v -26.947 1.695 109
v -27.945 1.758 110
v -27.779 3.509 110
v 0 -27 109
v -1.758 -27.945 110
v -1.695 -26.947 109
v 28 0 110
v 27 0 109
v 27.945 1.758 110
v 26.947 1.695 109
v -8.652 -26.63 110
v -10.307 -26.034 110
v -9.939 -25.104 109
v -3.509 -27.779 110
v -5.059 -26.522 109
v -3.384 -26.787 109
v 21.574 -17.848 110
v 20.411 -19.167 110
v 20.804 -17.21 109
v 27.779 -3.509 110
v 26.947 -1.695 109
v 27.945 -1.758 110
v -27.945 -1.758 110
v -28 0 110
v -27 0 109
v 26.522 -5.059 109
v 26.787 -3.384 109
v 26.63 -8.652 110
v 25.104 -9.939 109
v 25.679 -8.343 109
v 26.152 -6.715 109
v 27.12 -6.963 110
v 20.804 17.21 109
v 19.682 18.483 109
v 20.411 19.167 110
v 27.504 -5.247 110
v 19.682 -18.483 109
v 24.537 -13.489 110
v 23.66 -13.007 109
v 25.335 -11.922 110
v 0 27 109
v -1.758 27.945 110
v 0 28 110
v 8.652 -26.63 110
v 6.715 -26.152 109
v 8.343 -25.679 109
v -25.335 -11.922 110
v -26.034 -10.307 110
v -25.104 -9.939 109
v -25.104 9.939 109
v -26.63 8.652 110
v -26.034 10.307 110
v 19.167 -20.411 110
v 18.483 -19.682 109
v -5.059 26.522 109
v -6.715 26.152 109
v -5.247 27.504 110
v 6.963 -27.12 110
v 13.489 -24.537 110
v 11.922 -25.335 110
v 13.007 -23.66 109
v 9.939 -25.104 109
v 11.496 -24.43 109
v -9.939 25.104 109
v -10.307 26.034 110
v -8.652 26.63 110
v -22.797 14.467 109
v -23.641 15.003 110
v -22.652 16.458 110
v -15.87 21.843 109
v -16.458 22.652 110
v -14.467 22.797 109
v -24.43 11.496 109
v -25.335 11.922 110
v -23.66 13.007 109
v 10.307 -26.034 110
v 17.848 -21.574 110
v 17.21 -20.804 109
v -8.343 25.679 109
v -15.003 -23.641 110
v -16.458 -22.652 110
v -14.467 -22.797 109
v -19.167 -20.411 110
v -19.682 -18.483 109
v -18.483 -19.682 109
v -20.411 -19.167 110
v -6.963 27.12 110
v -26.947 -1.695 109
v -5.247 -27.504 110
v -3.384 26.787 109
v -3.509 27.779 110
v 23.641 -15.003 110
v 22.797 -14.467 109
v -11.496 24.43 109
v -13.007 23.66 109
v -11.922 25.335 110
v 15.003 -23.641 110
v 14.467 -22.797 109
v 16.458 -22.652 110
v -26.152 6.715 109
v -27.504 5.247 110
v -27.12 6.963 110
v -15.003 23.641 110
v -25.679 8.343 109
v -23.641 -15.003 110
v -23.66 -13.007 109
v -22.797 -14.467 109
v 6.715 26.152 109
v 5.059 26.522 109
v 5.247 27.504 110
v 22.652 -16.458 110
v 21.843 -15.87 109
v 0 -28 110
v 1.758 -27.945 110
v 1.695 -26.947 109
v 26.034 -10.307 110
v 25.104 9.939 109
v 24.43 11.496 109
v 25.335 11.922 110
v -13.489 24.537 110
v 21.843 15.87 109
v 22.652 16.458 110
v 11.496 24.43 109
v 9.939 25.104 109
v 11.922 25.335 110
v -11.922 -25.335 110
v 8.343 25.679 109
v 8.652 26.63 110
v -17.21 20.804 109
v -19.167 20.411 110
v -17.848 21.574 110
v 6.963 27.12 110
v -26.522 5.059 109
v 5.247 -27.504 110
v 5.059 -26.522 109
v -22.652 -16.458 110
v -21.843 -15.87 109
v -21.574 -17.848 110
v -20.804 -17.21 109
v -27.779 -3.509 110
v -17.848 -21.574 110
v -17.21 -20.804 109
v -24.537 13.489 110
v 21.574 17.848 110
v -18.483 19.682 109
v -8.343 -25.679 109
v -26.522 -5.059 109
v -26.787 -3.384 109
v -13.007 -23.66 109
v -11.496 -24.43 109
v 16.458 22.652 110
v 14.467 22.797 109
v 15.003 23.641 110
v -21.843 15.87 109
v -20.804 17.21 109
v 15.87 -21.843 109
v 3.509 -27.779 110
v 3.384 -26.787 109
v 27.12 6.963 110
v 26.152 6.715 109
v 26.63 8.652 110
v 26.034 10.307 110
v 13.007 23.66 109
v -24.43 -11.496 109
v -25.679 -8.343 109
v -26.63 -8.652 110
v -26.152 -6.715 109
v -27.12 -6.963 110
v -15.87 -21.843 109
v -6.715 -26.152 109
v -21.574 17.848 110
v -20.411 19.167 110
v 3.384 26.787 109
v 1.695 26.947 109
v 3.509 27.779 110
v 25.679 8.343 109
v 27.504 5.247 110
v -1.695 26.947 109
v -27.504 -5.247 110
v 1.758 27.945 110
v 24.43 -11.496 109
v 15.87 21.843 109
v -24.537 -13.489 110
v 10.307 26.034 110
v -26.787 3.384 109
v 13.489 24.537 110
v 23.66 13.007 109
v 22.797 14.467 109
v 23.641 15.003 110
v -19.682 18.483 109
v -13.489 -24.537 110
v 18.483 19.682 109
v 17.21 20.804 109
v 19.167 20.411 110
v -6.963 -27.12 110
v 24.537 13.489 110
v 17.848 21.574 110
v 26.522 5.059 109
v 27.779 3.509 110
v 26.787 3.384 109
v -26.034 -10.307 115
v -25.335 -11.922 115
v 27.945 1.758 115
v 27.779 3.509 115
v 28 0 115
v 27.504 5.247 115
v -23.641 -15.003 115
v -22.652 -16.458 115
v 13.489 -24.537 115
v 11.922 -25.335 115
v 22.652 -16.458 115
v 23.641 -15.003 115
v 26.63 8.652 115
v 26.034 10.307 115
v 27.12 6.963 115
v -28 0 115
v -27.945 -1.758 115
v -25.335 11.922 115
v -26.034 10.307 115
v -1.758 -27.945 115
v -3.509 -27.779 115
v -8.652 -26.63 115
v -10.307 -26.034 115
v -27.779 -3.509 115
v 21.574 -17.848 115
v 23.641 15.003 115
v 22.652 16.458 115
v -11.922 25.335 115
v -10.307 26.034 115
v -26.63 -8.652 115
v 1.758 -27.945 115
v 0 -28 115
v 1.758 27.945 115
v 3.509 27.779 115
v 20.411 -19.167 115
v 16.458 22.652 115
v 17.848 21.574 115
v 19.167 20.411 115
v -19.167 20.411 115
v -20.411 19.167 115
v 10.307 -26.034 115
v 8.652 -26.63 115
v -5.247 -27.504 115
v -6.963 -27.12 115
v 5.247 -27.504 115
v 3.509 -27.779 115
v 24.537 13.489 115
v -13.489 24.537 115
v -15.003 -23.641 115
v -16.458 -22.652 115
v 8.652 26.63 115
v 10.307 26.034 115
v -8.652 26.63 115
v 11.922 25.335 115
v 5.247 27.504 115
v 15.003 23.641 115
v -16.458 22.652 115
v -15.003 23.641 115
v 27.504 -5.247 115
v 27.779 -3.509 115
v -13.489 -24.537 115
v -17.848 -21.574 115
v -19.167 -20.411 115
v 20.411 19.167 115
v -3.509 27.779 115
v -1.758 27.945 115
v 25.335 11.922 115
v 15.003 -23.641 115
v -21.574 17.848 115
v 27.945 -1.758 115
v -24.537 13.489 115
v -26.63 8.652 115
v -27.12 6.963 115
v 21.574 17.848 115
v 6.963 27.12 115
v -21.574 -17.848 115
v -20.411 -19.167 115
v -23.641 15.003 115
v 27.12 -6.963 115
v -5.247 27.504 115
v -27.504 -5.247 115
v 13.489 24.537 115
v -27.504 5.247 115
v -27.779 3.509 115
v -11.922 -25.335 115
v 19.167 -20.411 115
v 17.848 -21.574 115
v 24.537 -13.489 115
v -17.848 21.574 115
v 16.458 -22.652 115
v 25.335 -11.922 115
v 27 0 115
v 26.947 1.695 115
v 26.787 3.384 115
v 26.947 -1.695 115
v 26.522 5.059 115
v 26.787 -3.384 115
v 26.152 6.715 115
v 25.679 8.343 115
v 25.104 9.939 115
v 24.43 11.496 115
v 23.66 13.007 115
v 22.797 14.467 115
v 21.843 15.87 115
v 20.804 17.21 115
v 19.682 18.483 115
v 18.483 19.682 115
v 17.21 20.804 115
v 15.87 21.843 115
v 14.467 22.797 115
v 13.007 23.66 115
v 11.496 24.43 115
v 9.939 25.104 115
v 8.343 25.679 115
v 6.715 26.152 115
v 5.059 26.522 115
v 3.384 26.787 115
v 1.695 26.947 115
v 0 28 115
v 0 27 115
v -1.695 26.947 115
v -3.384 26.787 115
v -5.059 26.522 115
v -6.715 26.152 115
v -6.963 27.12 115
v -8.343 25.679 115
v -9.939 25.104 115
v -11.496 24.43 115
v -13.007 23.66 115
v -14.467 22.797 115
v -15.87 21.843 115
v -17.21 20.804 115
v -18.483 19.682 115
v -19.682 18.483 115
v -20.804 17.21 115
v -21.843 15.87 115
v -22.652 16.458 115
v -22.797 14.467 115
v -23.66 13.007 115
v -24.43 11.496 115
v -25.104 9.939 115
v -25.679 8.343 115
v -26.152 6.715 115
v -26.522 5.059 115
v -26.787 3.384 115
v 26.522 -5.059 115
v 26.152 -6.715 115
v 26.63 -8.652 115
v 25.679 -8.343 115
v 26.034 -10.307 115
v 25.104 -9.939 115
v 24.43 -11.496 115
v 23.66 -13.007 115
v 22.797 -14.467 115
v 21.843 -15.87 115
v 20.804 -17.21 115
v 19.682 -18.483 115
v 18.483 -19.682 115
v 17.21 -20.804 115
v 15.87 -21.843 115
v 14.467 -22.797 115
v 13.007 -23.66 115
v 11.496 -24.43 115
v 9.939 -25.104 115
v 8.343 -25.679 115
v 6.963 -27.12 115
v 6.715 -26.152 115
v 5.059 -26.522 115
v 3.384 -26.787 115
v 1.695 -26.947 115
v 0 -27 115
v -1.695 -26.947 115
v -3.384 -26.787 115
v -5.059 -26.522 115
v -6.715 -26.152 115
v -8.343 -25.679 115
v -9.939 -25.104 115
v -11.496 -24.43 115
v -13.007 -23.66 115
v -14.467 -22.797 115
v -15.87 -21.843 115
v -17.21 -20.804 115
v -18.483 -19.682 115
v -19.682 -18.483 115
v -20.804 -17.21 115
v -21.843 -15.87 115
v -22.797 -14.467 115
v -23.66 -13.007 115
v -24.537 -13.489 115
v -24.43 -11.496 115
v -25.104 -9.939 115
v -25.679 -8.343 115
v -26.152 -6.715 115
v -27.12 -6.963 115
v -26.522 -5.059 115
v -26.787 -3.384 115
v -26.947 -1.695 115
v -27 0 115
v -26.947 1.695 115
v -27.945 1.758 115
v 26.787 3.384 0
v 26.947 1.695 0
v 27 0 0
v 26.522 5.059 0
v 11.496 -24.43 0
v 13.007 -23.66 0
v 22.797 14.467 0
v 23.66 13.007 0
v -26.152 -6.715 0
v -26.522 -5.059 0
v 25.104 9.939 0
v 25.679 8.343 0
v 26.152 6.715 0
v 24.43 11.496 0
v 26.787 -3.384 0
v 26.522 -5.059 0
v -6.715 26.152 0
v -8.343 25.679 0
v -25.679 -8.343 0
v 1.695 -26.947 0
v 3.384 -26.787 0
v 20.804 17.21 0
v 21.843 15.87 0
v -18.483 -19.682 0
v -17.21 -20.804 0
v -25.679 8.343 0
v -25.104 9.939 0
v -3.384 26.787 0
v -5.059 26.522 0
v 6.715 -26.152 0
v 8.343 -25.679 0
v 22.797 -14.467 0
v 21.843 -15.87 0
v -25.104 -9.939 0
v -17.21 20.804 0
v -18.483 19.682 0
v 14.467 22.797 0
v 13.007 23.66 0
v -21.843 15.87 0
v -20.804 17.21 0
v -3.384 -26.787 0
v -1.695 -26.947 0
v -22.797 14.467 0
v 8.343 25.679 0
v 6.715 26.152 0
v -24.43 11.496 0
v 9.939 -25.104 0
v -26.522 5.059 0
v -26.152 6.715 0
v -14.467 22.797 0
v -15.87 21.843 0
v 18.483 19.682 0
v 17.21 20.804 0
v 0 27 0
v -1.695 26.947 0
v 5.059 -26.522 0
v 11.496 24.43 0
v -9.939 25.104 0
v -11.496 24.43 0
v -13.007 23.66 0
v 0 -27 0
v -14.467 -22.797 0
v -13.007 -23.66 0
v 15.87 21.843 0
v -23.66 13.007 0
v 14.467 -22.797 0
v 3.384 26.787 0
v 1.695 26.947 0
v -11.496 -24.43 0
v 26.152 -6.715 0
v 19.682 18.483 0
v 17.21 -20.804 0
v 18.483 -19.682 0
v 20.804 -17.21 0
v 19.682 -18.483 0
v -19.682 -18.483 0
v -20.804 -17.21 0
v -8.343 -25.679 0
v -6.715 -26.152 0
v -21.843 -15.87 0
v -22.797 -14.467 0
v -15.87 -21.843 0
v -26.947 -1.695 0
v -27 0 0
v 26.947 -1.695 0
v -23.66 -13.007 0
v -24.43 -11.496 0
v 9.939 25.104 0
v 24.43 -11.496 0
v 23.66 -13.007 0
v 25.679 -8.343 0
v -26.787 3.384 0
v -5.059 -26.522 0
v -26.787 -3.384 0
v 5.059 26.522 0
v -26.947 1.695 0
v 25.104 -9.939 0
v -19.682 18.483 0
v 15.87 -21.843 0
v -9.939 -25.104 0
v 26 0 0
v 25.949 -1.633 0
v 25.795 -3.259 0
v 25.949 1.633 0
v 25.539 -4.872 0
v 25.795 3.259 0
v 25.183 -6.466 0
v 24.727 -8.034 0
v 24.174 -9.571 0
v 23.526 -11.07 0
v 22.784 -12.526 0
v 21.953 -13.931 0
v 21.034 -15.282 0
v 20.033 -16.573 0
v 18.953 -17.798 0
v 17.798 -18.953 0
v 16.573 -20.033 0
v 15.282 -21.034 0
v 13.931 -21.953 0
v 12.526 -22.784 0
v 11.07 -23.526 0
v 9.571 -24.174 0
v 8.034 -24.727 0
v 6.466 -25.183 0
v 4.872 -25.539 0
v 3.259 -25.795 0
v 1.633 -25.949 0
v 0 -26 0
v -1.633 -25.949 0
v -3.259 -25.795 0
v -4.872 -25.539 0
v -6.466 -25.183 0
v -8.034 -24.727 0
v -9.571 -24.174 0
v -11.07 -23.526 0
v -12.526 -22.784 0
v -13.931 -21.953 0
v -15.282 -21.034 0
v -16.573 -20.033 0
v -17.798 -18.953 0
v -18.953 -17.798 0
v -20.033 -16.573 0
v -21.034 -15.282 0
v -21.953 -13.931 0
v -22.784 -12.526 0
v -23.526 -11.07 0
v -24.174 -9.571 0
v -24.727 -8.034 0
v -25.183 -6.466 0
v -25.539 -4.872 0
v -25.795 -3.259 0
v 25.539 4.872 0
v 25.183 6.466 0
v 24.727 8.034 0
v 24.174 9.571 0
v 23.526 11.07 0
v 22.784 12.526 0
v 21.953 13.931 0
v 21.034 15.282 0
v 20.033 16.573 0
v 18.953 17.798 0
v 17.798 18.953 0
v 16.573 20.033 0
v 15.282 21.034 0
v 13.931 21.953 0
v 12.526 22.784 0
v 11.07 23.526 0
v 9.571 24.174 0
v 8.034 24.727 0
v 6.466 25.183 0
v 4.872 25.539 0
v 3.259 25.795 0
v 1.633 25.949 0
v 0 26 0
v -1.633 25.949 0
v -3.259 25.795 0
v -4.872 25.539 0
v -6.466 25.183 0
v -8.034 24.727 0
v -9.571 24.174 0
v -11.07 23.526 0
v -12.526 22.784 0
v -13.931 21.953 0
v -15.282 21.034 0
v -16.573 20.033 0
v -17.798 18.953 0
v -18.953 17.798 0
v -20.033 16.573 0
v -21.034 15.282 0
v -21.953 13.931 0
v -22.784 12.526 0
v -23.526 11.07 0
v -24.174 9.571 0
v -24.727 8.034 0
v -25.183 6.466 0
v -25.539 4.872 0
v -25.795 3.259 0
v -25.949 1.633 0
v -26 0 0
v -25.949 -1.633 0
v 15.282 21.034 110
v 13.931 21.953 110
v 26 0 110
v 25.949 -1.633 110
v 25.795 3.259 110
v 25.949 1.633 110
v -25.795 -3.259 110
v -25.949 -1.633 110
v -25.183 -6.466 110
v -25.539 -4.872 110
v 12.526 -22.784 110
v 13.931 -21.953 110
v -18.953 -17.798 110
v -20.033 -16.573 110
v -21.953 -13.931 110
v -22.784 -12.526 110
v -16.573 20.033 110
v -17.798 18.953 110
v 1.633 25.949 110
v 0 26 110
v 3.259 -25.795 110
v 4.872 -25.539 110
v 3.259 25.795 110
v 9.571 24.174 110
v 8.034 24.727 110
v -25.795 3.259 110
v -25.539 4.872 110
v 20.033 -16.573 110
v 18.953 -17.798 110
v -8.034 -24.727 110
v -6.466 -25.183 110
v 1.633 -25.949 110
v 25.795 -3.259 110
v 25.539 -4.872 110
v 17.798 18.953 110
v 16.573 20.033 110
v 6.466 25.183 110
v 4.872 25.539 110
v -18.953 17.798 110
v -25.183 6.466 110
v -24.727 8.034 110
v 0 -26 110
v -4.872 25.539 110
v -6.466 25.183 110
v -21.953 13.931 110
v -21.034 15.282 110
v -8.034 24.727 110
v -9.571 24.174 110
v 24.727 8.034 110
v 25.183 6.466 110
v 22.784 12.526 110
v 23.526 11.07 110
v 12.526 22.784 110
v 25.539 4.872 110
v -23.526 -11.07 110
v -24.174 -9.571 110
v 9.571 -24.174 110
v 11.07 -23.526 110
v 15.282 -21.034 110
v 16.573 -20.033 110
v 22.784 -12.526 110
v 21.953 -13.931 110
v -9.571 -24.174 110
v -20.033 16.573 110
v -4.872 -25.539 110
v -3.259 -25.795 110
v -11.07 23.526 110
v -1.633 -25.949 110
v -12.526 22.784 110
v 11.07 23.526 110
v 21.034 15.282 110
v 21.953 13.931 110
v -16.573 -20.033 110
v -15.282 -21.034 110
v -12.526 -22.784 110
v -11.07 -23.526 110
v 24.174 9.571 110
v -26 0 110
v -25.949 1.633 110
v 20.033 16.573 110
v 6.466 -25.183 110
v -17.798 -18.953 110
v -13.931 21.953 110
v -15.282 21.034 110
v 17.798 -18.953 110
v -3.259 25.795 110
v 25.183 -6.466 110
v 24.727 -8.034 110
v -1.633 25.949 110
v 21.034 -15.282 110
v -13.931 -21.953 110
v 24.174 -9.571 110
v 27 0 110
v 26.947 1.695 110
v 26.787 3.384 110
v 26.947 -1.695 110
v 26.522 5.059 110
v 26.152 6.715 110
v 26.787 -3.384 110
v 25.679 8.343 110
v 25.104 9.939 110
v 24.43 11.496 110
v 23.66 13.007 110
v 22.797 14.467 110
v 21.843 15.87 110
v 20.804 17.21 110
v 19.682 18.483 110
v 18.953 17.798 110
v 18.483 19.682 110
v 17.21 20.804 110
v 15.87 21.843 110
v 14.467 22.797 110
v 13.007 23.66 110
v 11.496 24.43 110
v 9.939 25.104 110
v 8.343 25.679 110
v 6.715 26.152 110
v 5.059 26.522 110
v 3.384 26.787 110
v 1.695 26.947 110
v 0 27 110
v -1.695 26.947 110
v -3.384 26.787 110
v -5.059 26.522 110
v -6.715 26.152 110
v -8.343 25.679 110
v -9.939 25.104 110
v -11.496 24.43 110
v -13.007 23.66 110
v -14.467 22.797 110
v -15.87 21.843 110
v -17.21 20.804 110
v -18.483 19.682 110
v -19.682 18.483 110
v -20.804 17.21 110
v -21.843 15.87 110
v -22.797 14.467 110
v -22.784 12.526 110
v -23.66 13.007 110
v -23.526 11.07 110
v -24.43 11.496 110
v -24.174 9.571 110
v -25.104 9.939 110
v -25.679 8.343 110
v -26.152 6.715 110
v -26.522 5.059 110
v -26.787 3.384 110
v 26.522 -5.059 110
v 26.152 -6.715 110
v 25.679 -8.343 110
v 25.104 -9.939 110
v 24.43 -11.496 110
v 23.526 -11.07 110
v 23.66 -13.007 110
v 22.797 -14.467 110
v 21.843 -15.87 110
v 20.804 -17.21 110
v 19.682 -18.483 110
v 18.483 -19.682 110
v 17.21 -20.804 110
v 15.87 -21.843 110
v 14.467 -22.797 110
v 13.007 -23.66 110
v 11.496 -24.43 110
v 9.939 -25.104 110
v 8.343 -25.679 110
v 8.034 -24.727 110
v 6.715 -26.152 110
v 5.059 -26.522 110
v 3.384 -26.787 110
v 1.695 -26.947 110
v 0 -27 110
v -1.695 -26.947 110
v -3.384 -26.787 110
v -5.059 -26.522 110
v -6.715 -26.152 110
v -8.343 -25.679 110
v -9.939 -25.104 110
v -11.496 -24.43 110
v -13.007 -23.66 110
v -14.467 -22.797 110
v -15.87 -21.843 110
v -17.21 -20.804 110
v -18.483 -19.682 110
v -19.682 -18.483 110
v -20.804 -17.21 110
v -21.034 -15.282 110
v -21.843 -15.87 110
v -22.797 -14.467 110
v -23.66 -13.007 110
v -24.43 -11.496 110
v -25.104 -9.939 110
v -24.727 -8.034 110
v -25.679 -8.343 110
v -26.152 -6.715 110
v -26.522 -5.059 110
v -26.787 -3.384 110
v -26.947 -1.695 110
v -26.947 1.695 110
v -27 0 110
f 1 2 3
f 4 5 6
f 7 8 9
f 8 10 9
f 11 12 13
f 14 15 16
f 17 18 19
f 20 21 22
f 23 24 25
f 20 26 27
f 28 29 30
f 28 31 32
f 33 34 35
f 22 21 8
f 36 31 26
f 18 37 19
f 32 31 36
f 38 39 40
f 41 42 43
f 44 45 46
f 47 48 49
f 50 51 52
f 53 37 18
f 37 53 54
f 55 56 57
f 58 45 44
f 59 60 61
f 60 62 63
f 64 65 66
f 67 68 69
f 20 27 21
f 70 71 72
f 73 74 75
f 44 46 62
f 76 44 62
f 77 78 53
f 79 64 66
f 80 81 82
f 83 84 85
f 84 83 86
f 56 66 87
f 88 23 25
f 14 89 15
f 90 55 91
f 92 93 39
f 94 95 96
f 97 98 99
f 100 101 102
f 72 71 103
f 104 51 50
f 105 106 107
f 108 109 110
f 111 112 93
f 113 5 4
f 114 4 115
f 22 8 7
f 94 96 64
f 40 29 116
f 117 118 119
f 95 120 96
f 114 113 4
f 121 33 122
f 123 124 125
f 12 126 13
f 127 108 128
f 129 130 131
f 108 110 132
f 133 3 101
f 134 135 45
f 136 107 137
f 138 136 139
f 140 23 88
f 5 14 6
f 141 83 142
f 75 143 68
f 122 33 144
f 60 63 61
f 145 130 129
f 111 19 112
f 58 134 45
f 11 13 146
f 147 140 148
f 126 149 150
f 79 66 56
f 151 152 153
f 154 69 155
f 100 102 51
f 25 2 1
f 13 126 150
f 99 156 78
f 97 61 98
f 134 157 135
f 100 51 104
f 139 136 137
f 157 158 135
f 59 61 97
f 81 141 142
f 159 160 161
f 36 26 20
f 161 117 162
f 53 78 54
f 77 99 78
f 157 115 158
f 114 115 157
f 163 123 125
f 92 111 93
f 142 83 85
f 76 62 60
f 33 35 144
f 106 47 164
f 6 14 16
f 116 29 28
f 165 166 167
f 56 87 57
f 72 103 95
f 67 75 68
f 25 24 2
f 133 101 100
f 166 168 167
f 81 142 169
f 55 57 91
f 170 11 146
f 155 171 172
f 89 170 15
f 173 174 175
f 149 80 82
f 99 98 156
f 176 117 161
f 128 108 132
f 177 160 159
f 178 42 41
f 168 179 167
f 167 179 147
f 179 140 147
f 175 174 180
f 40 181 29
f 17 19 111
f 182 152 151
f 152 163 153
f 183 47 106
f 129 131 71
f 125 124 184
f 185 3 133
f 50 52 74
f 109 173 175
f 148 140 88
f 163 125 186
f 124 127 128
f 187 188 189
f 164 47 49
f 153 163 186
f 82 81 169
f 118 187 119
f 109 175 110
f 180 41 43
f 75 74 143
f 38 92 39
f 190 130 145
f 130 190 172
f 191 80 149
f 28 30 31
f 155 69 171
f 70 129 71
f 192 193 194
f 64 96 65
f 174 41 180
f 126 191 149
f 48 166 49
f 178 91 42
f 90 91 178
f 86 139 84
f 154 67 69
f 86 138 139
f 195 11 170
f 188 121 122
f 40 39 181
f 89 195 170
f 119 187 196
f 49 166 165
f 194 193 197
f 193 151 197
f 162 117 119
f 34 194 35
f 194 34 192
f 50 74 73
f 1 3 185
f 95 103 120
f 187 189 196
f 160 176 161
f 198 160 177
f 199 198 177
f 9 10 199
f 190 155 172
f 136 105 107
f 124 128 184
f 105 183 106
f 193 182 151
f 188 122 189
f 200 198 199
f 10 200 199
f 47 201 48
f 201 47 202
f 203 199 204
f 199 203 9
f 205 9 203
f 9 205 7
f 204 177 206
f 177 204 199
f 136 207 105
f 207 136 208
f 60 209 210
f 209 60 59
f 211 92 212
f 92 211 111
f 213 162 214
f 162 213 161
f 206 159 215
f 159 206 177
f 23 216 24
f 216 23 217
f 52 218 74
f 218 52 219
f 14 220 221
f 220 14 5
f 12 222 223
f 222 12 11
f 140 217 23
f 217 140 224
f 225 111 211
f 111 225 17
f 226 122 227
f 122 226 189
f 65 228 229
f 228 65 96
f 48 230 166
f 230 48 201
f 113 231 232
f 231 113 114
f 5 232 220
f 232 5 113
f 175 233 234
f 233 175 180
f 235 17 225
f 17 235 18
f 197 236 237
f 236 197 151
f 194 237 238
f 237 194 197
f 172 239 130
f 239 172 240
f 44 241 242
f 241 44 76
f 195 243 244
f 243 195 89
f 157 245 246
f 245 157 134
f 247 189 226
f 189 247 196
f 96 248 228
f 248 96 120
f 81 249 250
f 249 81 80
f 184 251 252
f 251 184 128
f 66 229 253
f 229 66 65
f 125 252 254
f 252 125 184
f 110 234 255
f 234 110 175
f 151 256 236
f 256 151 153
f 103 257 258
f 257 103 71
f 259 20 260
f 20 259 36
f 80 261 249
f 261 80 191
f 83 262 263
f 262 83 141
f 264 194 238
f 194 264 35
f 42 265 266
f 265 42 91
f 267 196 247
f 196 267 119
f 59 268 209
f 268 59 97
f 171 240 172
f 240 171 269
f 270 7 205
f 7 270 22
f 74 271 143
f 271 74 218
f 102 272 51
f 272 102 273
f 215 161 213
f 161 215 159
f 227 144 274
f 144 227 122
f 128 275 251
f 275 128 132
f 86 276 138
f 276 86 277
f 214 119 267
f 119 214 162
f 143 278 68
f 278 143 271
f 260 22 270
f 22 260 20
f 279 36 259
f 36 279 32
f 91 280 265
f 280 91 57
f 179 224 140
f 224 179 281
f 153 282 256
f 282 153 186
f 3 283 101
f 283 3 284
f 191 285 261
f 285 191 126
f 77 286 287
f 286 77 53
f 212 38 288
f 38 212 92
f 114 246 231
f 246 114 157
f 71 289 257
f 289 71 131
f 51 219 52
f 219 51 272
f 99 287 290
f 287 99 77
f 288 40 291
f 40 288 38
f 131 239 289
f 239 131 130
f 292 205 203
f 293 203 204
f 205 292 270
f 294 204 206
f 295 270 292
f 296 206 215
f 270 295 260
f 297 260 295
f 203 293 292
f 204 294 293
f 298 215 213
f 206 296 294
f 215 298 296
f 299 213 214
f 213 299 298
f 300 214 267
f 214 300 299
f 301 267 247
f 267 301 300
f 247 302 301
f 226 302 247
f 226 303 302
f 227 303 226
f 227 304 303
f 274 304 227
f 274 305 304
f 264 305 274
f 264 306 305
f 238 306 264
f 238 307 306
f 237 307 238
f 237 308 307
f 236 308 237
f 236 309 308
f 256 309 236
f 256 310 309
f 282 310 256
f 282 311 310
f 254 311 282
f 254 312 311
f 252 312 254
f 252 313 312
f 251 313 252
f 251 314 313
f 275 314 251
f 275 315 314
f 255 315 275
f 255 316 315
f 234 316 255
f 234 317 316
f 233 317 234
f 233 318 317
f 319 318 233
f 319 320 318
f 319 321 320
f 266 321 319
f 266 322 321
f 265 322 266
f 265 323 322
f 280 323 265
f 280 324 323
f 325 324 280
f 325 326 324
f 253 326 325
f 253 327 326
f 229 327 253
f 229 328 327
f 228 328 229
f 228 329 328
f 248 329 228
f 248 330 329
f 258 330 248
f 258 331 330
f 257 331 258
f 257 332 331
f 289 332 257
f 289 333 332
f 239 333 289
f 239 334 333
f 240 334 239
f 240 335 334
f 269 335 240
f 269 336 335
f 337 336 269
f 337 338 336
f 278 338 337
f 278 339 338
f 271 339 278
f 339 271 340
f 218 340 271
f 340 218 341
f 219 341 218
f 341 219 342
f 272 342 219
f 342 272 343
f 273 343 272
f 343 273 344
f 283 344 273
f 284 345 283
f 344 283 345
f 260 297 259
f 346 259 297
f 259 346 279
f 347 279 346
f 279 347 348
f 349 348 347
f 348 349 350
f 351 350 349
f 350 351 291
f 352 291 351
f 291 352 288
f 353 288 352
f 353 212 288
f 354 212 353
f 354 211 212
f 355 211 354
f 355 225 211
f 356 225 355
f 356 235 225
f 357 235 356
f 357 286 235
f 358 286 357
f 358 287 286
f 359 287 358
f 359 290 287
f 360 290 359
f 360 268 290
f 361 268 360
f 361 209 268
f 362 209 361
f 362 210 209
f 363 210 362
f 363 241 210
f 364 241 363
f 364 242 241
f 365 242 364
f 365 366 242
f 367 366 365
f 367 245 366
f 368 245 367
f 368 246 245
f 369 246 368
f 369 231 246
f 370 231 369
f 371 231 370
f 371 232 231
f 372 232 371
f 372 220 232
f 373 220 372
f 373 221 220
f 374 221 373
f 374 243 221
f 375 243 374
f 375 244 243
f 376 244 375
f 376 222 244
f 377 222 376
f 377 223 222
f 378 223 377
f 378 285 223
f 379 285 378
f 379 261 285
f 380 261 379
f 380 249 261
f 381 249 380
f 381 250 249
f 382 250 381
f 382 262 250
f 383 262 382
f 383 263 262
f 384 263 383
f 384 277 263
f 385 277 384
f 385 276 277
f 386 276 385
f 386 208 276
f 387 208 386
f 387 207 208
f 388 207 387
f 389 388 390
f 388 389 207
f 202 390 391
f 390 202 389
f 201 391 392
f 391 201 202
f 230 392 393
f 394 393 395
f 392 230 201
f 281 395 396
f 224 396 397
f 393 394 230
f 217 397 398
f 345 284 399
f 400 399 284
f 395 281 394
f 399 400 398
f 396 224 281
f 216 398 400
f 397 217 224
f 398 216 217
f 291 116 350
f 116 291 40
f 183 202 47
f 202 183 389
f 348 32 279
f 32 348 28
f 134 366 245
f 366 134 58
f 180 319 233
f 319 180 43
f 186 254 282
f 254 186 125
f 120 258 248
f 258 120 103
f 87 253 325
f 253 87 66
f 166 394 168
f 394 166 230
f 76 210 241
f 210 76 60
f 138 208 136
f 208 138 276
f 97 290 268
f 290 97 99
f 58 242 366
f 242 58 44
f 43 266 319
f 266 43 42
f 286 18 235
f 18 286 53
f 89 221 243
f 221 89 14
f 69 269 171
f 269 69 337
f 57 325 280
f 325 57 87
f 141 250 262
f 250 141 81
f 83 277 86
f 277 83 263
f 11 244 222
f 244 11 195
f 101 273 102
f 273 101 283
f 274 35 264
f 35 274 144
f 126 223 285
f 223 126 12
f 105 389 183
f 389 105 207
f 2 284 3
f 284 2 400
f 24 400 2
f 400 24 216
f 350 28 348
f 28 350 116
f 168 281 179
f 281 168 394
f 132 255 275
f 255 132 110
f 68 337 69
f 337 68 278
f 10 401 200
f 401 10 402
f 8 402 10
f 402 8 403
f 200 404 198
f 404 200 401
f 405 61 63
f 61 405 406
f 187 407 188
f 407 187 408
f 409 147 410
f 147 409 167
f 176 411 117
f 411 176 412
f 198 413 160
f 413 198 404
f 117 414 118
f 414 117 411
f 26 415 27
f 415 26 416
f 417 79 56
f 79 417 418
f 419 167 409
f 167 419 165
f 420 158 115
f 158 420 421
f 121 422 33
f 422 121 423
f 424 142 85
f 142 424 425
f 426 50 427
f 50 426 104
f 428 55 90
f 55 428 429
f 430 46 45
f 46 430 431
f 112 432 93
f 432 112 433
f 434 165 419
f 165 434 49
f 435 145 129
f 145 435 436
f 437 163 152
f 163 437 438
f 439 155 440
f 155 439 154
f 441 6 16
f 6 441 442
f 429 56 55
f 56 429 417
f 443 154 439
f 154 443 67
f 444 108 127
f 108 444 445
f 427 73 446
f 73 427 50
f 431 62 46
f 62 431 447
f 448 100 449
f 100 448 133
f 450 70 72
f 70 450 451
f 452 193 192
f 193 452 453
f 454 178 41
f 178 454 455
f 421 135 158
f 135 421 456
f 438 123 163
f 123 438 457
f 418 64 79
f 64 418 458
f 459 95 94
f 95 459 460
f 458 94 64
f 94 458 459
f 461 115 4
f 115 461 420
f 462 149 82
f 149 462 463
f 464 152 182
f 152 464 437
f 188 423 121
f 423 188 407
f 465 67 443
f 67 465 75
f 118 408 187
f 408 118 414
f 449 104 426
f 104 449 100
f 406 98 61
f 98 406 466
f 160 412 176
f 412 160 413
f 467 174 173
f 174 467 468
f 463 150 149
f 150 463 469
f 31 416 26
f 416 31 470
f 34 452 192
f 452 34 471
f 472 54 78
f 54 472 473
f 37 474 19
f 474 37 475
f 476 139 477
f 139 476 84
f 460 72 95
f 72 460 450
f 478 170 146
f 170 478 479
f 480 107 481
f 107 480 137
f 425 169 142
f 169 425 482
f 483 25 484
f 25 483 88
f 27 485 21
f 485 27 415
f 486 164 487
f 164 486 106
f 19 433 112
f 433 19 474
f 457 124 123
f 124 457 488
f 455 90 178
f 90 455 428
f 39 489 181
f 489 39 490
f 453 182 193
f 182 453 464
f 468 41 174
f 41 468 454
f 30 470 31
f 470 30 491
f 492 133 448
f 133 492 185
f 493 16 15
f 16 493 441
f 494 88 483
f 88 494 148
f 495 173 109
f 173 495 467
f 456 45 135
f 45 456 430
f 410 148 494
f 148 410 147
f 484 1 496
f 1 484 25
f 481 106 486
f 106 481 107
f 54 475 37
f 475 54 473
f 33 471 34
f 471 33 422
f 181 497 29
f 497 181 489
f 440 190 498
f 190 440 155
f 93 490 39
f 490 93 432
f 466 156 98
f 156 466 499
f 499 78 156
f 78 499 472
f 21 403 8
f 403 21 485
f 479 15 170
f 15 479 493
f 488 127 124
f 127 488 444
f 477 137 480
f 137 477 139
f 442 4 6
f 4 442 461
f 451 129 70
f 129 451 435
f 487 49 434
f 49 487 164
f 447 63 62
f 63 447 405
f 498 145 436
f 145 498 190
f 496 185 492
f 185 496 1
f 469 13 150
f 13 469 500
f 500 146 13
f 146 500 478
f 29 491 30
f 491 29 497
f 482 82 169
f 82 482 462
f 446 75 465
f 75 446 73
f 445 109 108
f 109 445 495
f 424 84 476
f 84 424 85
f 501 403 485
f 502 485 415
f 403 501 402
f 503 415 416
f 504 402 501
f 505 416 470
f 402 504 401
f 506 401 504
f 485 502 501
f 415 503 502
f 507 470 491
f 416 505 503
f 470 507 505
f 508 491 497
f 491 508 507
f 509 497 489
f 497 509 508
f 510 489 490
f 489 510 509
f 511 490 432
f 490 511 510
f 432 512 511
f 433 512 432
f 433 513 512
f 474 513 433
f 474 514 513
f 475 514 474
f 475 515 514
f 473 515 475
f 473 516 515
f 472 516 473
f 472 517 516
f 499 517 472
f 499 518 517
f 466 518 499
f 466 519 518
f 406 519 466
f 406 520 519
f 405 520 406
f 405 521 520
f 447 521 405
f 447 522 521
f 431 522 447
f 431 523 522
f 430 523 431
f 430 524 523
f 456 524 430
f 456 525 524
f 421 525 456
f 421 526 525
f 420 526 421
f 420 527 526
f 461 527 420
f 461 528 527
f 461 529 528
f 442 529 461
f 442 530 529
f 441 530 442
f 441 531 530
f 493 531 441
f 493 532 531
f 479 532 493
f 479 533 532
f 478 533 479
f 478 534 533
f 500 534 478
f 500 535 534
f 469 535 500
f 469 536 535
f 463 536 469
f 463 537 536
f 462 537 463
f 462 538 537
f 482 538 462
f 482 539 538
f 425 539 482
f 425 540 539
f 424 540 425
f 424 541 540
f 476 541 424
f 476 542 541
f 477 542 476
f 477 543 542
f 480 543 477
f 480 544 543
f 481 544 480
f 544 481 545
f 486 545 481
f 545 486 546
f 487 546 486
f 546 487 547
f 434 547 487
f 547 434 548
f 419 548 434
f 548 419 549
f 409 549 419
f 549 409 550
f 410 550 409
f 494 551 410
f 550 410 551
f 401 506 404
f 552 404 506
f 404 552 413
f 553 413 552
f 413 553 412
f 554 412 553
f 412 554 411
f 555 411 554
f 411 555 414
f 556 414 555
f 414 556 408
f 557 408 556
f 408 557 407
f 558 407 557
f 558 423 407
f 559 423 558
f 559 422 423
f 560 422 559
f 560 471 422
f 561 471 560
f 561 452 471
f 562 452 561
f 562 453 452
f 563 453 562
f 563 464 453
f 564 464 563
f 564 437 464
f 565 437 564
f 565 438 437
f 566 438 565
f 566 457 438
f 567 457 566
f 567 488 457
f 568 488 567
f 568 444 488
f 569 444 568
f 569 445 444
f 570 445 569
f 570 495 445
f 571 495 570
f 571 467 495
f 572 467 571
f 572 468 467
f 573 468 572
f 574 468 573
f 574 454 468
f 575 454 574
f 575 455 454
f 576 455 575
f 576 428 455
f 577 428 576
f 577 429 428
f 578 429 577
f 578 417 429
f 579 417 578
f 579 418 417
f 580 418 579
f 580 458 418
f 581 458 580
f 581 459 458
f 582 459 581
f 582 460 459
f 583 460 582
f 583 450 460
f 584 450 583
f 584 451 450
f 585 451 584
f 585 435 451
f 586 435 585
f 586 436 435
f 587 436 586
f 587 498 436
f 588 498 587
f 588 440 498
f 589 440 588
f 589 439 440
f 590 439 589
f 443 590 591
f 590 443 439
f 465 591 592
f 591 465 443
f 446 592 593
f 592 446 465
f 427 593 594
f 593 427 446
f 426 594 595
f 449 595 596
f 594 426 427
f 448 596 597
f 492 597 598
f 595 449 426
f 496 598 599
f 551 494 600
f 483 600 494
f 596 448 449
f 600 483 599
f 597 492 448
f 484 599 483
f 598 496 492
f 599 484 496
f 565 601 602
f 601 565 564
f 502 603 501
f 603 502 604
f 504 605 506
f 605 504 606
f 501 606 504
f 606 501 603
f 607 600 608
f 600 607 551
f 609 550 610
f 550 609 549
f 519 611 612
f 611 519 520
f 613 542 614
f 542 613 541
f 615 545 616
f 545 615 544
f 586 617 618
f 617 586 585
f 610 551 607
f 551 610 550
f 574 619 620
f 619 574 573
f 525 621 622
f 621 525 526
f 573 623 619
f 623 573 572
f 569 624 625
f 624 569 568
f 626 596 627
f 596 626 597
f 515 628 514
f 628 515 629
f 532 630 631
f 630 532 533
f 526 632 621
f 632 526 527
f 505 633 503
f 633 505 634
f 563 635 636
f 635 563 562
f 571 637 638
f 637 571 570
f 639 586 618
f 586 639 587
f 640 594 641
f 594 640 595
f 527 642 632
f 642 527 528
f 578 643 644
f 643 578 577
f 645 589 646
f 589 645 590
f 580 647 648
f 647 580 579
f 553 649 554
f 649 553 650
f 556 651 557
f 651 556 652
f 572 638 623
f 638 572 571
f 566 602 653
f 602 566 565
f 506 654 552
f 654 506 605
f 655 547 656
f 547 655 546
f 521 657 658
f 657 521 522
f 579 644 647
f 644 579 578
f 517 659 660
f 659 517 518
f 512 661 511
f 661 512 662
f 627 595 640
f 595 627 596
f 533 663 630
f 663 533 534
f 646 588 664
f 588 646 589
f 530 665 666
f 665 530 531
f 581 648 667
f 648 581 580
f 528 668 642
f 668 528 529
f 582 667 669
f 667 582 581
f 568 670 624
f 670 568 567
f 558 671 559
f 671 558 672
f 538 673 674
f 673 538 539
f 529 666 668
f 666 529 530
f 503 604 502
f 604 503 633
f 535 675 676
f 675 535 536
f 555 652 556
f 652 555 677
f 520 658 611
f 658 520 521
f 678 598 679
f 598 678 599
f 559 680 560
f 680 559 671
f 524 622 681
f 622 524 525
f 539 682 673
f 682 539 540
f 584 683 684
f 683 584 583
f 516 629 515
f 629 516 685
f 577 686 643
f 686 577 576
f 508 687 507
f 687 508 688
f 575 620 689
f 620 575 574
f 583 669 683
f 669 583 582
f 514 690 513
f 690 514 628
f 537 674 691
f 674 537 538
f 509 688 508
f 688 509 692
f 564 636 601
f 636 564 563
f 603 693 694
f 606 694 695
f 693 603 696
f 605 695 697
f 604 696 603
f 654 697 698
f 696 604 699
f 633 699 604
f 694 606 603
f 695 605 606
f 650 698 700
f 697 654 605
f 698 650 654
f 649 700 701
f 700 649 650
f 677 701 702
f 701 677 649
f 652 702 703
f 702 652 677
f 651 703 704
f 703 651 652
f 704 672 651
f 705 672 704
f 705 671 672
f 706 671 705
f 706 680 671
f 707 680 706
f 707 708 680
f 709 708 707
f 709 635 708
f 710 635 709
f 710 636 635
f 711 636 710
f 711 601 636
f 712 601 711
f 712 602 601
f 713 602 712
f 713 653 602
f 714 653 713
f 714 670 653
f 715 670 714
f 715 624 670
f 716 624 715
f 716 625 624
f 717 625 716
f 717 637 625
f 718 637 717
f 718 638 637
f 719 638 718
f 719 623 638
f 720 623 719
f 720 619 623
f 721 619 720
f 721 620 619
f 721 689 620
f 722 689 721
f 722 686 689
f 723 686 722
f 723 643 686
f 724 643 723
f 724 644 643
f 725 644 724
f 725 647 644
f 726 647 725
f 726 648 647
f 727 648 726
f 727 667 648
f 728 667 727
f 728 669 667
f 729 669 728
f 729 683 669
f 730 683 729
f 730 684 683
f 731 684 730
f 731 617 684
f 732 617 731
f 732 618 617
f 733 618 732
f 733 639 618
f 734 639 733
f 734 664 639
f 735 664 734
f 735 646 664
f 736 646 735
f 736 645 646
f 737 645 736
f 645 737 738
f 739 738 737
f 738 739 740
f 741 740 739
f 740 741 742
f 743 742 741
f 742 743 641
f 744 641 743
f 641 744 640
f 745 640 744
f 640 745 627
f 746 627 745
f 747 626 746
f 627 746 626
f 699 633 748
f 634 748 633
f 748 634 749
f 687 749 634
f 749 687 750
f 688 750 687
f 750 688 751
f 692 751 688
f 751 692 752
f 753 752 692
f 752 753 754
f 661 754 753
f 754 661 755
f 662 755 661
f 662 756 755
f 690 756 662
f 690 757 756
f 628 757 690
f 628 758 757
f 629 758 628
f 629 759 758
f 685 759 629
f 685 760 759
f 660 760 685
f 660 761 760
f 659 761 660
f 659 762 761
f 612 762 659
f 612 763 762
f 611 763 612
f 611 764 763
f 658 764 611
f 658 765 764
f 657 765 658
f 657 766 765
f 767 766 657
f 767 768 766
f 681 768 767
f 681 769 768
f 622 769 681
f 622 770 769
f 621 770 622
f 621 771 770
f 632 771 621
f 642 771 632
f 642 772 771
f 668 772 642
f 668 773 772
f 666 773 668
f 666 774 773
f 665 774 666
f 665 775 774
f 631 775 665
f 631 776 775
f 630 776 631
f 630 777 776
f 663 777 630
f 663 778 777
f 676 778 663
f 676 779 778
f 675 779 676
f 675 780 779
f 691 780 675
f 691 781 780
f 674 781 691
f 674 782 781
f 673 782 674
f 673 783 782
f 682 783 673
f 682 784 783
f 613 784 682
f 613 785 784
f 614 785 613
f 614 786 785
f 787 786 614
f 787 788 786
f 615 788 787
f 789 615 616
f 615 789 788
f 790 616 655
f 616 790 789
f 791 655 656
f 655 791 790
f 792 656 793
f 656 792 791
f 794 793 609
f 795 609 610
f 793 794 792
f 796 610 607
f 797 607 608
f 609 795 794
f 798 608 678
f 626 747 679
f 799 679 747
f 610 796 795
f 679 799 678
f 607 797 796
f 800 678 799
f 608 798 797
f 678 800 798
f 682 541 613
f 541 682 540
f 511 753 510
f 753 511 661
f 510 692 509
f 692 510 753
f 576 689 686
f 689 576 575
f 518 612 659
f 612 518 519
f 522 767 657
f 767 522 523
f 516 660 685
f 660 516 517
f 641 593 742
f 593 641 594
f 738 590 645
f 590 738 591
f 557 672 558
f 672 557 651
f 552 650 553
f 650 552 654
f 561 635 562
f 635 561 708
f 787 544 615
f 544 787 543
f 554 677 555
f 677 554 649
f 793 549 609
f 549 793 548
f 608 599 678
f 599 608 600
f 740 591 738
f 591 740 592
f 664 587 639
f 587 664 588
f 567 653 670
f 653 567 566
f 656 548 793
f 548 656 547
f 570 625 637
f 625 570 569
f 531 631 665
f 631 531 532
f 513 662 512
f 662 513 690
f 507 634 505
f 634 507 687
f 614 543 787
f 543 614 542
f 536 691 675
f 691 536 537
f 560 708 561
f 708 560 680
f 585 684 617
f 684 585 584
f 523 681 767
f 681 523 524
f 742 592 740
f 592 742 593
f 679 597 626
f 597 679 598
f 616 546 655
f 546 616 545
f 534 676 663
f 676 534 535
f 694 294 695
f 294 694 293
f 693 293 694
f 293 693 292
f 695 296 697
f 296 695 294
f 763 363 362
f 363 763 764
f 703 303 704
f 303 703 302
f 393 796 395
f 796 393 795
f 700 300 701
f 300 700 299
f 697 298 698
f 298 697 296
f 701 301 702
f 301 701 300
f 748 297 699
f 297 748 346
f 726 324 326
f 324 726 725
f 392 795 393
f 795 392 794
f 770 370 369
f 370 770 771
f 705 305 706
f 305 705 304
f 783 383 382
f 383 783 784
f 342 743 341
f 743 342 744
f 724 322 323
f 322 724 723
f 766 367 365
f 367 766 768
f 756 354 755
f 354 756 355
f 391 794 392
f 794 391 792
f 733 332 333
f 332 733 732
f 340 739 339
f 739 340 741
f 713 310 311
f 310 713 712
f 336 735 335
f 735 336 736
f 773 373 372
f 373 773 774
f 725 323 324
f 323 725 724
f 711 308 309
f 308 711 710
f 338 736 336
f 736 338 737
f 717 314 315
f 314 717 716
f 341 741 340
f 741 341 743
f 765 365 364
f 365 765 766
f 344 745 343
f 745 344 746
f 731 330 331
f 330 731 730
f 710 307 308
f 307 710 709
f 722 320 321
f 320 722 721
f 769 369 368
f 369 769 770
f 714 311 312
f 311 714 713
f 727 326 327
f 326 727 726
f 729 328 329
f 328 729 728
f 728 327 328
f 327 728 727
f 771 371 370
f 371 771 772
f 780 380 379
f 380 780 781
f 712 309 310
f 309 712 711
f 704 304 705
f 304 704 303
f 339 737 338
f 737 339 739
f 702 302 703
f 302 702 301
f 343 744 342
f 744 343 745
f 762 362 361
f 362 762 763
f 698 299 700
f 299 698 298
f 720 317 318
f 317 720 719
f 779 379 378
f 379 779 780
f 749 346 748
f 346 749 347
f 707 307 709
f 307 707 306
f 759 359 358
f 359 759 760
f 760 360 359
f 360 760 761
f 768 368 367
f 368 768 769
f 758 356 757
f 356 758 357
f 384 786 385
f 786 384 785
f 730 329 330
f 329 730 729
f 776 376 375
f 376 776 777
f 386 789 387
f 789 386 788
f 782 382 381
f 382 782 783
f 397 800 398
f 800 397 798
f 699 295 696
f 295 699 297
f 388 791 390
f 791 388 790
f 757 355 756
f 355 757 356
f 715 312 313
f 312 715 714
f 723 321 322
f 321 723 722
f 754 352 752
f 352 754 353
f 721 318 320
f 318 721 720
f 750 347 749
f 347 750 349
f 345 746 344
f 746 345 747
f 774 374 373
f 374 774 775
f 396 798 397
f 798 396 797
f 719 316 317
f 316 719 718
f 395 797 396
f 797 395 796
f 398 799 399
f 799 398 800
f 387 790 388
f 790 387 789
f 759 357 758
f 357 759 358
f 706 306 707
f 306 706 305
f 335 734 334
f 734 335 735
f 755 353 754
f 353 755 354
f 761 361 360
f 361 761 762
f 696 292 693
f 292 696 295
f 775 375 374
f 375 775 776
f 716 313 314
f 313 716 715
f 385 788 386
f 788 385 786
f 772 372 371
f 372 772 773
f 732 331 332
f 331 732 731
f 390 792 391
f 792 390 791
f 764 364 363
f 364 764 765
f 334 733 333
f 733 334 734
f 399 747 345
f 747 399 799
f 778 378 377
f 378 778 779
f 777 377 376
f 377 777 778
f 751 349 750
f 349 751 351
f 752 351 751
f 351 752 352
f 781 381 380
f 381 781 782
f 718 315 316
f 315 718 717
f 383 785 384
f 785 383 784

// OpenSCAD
$fn = 100;

module socket(inner = 52 / 2, thickness = 1, height = 110, flange = 5, $fn = $fn) {
    difference() {
        union() {
            cylinder(r = inner + thickness, h = height, $fn = $fn);
            translate([0, 0, height]) {
                translate([0, 0, -1]) cylinder(r1 = inner + thickness, r2 = inner + (thickness * 2), h = thickness);
                cylinder(r = inner + (thickness * 2), h = flange);
            }
        }
        union() {
            cylinder(r = inner, h = height, $fn = $fn);
            translate([0, 0, height]) {
                cylinder(r = inner + thickness, h = flange);
            }
        }
    }
}

socket();
